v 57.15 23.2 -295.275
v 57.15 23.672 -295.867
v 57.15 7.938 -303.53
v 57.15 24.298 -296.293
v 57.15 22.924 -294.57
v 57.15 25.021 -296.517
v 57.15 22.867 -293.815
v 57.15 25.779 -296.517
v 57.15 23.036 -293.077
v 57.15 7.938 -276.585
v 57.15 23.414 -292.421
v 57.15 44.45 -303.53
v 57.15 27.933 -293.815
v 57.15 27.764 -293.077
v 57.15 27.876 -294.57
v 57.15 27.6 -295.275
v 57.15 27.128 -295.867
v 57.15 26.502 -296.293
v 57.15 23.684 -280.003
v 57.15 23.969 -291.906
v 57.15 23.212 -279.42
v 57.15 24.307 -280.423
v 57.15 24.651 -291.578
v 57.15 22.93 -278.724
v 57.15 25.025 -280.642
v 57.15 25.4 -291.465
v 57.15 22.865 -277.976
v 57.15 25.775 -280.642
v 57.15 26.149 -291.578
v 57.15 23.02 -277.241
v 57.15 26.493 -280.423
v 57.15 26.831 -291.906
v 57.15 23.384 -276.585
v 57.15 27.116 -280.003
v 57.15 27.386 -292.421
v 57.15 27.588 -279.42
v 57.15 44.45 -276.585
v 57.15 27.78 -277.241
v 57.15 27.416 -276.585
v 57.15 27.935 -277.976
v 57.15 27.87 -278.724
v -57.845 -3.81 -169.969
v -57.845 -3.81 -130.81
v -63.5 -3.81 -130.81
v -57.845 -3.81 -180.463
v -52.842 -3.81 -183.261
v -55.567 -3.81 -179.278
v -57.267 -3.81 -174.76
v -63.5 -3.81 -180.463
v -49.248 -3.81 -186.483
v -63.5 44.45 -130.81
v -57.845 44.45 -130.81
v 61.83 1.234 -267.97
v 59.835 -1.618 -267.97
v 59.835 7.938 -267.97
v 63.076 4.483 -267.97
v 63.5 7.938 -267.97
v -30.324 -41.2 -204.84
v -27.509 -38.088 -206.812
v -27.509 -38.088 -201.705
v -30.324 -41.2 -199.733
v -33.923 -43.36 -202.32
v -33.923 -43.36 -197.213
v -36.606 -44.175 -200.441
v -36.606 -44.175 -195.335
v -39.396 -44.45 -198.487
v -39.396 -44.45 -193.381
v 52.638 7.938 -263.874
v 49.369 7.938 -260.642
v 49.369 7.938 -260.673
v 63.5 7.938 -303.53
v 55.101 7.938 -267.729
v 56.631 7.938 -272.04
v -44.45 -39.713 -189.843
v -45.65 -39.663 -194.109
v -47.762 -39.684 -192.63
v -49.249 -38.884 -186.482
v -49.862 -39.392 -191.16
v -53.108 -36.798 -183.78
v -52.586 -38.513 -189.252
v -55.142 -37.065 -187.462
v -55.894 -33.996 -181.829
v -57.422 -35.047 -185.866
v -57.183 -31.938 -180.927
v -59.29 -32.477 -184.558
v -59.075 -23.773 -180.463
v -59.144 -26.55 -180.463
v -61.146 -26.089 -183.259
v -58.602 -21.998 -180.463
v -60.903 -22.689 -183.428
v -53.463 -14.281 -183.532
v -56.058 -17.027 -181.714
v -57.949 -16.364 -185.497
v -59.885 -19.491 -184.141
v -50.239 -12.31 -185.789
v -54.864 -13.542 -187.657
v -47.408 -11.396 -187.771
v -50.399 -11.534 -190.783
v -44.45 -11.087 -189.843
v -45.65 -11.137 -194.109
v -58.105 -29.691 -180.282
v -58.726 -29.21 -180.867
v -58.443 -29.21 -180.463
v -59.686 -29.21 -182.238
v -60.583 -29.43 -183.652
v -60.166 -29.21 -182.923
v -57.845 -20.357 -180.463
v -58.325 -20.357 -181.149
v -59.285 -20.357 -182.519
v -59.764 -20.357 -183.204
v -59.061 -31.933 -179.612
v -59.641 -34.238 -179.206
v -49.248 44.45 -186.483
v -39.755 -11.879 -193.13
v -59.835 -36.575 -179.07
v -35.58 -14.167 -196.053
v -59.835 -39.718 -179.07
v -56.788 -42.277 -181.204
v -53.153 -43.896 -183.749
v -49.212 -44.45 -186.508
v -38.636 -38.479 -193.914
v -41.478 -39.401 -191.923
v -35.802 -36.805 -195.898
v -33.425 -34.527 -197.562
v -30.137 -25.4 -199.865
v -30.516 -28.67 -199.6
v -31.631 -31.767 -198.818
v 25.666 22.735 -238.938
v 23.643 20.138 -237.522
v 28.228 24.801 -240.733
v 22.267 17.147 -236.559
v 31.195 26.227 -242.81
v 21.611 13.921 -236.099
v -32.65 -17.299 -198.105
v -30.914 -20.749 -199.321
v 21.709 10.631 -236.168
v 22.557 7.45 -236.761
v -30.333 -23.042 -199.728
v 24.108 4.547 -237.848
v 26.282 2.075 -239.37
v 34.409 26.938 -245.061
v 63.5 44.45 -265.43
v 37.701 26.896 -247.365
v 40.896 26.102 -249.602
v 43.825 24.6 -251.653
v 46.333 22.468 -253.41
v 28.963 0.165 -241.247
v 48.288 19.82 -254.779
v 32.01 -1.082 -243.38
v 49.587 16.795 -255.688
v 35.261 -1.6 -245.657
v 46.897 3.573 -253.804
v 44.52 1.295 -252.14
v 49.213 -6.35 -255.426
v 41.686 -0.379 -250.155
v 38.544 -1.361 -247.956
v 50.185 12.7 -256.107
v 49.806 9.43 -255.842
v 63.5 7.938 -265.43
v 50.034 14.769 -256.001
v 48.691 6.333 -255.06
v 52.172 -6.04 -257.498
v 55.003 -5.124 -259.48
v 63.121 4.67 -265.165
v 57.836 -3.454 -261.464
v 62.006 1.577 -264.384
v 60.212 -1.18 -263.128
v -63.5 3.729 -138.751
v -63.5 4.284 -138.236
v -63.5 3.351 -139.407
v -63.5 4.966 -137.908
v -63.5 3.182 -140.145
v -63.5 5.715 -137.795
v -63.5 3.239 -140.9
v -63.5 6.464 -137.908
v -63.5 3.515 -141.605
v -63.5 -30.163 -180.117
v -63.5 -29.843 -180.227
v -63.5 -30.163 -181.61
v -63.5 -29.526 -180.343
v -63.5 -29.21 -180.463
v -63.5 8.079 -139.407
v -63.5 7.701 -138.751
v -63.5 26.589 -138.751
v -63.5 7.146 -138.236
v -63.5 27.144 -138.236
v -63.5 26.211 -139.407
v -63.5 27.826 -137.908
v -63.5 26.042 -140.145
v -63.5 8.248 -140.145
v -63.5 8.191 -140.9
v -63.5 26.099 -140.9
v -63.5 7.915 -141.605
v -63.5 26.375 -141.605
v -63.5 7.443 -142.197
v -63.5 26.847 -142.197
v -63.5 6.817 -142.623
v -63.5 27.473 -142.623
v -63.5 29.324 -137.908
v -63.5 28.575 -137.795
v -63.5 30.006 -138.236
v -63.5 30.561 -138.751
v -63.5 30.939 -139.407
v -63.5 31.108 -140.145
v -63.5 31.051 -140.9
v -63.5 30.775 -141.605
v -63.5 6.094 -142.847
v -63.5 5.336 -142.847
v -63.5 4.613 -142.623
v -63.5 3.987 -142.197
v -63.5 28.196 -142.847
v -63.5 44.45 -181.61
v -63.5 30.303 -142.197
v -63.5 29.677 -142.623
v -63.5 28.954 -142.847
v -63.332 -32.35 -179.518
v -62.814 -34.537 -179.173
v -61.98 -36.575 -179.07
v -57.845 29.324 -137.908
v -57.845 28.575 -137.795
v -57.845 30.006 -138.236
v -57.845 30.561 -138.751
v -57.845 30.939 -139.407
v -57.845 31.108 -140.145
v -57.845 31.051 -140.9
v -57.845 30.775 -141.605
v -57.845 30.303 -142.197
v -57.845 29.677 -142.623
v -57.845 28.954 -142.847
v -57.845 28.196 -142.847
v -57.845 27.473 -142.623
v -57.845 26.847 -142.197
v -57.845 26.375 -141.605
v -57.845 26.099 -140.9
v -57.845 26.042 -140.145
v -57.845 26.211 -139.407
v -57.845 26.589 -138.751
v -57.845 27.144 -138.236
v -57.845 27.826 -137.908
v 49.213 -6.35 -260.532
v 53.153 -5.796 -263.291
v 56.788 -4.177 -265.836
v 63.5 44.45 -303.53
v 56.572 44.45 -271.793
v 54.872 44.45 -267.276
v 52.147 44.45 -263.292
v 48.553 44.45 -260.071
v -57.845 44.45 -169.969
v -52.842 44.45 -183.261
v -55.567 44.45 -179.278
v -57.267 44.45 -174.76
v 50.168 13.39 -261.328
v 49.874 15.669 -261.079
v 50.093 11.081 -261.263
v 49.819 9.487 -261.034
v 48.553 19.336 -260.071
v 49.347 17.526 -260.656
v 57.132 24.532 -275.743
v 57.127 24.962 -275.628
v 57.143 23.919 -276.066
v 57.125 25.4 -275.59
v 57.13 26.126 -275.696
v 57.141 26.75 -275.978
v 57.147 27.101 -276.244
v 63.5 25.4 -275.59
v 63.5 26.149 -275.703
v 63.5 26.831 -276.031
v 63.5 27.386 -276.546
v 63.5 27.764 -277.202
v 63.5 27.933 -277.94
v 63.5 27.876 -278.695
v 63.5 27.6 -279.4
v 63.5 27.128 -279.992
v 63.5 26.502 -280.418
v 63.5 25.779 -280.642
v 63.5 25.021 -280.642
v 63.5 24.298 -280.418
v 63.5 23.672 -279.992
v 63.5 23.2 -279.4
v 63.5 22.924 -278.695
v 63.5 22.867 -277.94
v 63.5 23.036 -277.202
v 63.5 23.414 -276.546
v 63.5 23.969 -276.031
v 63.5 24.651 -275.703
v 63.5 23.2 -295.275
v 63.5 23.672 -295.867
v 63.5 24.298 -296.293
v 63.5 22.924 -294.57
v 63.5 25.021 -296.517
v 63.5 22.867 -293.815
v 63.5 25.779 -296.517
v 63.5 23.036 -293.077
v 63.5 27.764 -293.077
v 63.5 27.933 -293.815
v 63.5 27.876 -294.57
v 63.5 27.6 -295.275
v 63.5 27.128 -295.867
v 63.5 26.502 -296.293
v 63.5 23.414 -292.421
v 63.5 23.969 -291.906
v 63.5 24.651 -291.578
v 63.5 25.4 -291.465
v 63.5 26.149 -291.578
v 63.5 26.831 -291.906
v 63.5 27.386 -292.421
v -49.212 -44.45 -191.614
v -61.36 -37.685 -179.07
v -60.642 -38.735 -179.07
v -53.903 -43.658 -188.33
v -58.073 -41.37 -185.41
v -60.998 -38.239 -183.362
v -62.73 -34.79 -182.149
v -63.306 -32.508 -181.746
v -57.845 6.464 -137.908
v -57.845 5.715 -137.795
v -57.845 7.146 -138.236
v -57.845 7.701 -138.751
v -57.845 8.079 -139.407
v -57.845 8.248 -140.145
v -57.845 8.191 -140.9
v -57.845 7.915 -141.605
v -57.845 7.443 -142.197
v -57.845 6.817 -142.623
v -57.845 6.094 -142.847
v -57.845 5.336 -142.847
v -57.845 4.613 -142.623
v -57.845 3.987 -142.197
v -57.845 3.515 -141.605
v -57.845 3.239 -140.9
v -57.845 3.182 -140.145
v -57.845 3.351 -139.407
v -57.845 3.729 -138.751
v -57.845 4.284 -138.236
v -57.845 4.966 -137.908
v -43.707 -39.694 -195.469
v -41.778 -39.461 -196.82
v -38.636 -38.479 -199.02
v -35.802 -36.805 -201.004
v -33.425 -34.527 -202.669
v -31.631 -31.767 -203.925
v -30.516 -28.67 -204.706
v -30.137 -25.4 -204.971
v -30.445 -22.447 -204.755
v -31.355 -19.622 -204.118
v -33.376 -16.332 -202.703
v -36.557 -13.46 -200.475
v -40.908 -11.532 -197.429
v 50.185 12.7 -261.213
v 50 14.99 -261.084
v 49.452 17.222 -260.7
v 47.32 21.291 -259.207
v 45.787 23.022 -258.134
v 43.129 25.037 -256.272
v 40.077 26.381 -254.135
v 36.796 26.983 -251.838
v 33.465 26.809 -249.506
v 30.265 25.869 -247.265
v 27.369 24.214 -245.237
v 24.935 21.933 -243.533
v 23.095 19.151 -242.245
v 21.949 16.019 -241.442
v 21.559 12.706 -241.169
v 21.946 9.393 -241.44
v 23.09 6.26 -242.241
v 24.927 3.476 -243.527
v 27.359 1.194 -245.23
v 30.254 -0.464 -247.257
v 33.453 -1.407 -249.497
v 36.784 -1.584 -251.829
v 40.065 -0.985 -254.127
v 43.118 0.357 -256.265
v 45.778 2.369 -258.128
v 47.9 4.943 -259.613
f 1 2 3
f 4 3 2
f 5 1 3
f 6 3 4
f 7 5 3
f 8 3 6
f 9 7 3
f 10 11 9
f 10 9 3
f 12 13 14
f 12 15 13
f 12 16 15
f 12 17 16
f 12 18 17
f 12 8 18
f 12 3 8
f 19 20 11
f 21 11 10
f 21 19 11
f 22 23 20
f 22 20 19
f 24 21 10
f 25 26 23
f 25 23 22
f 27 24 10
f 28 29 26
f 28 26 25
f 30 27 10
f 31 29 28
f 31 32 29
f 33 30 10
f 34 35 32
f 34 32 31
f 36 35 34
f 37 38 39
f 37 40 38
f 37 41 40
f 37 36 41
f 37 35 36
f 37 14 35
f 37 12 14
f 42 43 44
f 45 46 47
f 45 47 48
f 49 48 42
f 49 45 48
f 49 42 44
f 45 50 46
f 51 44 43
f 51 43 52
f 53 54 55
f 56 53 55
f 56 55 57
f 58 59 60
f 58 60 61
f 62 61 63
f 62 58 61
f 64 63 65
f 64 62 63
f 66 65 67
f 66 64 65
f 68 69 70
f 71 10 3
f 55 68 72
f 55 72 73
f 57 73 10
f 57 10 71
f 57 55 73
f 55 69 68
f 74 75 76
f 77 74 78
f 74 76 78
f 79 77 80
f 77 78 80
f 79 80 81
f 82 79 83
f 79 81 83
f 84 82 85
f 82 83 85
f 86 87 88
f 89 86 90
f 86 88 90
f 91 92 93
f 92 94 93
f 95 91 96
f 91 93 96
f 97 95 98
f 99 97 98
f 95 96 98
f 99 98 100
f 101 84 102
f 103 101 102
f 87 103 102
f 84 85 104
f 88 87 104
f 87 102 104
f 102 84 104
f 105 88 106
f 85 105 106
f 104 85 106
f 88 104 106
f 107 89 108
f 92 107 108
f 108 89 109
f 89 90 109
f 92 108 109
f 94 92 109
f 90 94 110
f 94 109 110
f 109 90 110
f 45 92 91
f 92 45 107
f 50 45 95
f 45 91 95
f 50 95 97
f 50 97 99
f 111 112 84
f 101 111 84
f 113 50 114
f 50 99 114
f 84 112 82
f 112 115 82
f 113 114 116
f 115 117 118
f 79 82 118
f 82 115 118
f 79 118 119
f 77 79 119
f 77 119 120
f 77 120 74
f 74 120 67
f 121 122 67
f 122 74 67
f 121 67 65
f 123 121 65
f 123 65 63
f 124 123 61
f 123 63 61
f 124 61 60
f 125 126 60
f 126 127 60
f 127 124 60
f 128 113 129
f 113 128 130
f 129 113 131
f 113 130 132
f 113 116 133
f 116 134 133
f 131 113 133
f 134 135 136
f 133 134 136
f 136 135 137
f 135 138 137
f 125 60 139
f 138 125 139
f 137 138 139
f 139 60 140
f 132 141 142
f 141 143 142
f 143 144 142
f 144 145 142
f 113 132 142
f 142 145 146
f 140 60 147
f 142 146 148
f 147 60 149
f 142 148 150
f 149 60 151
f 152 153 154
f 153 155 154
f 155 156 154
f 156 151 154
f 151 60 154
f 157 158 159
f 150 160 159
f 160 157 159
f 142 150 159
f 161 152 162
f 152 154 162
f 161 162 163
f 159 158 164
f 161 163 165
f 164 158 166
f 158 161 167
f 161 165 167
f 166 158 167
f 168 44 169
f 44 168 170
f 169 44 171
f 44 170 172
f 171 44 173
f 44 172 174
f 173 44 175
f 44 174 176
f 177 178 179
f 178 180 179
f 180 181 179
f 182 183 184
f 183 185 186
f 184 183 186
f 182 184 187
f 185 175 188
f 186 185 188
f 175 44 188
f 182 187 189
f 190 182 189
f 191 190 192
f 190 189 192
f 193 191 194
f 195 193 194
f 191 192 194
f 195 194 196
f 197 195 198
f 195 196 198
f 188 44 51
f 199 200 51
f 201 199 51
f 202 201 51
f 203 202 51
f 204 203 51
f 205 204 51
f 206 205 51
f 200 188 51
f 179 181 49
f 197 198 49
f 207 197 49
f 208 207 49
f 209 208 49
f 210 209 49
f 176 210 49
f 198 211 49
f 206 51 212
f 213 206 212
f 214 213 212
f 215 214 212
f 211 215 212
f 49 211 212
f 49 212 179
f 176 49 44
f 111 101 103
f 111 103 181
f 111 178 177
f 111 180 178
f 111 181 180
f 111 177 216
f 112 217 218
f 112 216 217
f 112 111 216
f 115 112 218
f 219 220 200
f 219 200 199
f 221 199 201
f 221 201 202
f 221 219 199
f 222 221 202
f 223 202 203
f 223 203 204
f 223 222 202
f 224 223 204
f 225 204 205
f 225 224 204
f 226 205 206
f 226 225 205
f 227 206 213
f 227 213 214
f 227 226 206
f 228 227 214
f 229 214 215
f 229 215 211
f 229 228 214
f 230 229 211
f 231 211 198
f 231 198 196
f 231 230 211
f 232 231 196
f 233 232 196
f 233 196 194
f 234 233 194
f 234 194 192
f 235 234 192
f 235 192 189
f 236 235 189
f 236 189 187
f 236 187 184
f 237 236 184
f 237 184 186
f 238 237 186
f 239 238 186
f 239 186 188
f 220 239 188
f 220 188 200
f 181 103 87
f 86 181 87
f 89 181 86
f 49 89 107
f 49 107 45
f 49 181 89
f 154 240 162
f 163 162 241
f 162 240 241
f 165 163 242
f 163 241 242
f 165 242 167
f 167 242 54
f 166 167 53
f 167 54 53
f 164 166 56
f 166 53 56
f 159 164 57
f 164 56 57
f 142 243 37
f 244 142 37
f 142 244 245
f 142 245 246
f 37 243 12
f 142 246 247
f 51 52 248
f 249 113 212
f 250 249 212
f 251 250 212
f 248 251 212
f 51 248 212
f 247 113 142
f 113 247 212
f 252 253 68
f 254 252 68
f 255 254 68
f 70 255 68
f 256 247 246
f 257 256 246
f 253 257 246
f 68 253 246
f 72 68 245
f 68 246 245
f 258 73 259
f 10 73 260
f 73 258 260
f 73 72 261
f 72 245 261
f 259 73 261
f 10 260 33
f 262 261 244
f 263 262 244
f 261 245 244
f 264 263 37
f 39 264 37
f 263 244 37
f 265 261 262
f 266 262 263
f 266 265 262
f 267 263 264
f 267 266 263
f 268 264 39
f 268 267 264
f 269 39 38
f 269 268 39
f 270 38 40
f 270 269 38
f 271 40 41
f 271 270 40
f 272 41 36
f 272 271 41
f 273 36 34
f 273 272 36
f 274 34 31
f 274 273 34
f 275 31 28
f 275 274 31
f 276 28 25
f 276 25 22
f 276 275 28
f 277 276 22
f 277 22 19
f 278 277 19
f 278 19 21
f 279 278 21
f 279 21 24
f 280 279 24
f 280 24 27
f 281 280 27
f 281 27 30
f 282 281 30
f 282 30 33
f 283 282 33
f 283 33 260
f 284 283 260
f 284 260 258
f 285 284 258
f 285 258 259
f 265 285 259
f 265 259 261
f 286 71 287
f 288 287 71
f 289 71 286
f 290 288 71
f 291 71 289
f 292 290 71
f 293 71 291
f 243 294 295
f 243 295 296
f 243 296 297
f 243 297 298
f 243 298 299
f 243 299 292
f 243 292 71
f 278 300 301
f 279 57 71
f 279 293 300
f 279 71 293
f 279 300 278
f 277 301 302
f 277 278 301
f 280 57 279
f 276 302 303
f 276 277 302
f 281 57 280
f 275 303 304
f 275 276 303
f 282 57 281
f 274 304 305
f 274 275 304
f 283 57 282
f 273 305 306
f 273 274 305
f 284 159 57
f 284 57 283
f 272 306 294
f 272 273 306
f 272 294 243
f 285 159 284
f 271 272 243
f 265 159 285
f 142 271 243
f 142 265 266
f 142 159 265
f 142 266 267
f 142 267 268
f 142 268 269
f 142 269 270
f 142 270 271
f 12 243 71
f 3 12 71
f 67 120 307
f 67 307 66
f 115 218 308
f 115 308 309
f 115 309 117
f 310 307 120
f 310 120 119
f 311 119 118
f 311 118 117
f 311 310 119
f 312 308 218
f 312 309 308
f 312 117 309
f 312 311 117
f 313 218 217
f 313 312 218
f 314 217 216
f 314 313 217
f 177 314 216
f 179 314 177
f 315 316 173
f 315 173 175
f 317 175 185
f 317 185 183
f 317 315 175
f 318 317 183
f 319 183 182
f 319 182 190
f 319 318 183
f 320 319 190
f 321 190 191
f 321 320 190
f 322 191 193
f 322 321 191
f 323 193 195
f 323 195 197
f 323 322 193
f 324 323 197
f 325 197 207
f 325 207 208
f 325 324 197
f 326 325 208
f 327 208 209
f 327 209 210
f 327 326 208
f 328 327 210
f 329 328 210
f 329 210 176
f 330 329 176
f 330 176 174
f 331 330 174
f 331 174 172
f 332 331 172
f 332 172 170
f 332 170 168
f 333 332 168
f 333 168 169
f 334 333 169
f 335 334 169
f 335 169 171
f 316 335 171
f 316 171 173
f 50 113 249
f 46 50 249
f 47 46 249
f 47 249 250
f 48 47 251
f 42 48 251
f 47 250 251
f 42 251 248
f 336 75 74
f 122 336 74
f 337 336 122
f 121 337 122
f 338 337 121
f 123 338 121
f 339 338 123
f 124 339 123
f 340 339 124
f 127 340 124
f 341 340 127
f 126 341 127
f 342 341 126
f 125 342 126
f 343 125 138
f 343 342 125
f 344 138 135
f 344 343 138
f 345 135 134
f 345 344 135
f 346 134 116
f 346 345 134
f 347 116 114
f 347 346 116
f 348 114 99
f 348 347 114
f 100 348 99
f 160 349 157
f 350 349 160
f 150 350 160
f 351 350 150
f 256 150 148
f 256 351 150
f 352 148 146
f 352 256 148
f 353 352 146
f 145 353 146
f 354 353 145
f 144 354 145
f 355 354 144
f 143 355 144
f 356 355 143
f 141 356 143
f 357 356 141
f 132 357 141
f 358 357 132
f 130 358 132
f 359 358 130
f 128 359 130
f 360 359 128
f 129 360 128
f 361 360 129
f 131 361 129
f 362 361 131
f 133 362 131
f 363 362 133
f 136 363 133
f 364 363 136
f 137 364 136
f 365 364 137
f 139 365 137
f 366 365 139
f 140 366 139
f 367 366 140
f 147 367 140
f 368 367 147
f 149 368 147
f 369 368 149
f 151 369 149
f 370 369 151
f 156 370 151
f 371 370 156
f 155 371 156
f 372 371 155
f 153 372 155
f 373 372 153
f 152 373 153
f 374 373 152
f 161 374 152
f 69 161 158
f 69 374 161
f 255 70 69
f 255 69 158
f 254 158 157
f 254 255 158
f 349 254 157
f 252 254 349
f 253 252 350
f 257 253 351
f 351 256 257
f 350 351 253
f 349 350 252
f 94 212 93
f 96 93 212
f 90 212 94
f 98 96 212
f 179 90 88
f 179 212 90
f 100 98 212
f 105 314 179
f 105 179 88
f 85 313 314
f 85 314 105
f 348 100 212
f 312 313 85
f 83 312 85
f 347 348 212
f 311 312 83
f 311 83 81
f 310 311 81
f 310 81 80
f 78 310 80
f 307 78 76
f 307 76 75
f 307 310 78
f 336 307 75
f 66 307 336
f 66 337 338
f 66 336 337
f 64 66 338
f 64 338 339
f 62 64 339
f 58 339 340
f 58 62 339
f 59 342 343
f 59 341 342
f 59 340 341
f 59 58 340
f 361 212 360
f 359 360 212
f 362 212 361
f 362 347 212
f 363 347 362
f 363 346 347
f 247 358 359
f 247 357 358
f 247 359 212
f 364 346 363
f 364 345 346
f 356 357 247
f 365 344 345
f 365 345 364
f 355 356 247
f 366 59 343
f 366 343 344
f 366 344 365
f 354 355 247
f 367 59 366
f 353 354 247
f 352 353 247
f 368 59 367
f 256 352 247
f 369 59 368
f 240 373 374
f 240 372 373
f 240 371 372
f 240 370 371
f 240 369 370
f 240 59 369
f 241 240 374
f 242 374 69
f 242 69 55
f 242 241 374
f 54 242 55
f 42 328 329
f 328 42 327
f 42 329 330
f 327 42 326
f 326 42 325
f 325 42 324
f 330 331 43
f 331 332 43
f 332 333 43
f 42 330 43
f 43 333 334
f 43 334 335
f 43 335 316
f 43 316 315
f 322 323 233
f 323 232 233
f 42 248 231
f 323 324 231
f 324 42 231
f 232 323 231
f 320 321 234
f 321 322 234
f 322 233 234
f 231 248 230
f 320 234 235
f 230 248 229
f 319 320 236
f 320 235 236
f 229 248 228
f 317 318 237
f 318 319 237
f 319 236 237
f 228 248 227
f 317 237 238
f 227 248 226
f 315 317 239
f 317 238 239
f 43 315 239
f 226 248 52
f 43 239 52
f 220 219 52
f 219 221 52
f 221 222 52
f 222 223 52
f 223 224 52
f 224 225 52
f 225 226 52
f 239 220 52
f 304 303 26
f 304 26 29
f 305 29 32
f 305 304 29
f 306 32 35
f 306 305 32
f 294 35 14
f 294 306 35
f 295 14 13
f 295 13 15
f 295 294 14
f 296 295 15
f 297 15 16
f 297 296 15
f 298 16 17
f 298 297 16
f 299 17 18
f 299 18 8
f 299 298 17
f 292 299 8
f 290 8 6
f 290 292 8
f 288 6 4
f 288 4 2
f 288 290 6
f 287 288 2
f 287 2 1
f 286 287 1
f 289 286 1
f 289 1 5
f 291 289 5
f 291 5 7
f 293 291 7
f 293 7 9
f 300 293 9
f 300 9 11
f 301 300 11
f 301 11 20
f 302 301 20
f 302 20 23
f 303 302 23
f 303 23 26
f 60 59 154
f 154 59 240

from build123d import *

# Parameters (mm, degrees)
SKETCH1_R                = 14.312899999999999
BOSS_EXTRUDE1_DEPTH      = 6.35
FILLET1_R                = 14.2875
SKETCH2_W                = 63.5
SKETCH2_H                = 38.099999999999994
BOSS_EXTRUDE2_DEPTH      = 6.35
FILLET2_R                = 14.2875
SKETCH5_W                = 80.56082205671558
SKETCH5_H                = 59.96207335790194
CUT_EXTRUDE3_DEPTH       = 105.34114720473416
SKETCH6_R                = 14.312899999999999
BOSS_EXTRUDE3_DEPTH      = 88.89999999999999
CHAMFER1_SIZE            = 123.334861862
CHAMFER1_SIZE_2          = 86.36
CHAMFER2_START           = -41.62371919
CHAMFER2_OUTLINE_W       = 158.00000000000003
CHAMFER2_OUTLINE_H       = 88.9
CHAMFER2_DEPTH           = 70.741970545
BOSS_EXTRUDE4_DEPTH      = 6.35
BOSS_EXTRUDE5_DEPTH      = 73.65999999999998
CUT_EXTRUDE9_DEPTH       = 140.7047508401556
CUT_EXTRUDE9_DEPTH_BACK  = 140.7047508401556
CUT_EXTRUDE10_DEPTH      = 73.65999999999998
CUT_EXTRUDE10_DEPTH_BACK = 184.87947802715968
FILLET3_R                = 20.16
SKETCH19_R               = 2.539999999999996
CUT_EXTRUDE11_DEPTH      = 184.87947795602068
SKETCH20_R               = 2.5400000000000027
SKETCH20_R_2             = 2.540000000000001
CUT_EXTRUDE12_DEPTH      = 188.65942191717963
FILLET4_R                = 20.16
CUT_EXTRUDE13_DEPTH      = 330.8952367610784
CUT_EXTRUDE13_DEPTH_BACK = 330.8952367610784
SKETCH21_W               = 304.0212933781311
SKETCH21_H               = 127.80861110845143


with BuildPart() as part:
    # Sketch1 → Boss-Extrude1 (new body)
    with BuildSketch(Plane.XY):
        Polygon((-6.34999999999998, -6.349999999999993), (63.500000000000014, -6.349999999999988), (63.50000000000003, 44.44999999999999), (-63.49999999999997, 44.44999999999999), (-63.49999999999994, -44.45), (-31.749999999999943, -44.45), align=None)
        with Locations((-44.44999999999997, -25.400000000000006)):
            Circle(SKETCH1_R, mode=Mode.SUBTRACT)
        with Locations((35.87185256827684, 12.70000000000001)):
            Circle(SKETCH1_R, mode=Mode.SUBTRACT)
    extrude(amount=BOSS_EXTRUDE1_DEPTH)

    # Fillet1
    fillet1_edges = [part.edges().sort_by_distance(p)[0] for p in [
        (-31.749999999999943, -44.45, 3.175),
        (-63.49999999999994, -44.45, 3.175),
        (63.50000000000002, -6.349999999999987, 3.175),
        (-6.349999999999981, -6.349999999999993, 3.175),
    ]]
    fillet(fillet1_edges, radius=FILLET1_R)

    # Sketch2 → Boss-Extrude2 (add)
    with BuildSketch(Plane.XY.offset(6.35)):
        with Locations((2.842e-14, 63.499999999999986)):
            Rectangle(SKETCH2_W, SKETCH2_H)
    extrude(amount=-BOSS_EXTRUDE2_DEPTH)

    # Fillet2
    fillet2_edges = [part.edges().sort_by_distance(p)[0] for p in [
        (-31.74999999999997, 82.54999999999998, 3.175),
        (31.75000000000003, 82.54999999999998, 3.175),
        (31.75000000000003, 44.44999999999999, 3.175),
    ]]
    fillet(fillet2_edges, radius=FILLET2_R)

    # Sketch5 → Cut-Extrude3 (cut, through all)
    with BuildSketch(Plane.XY.offset(6.35)):
        with Locations((8.530411028357818, 74.43103667895096)):
            Rectangle(SKETCH5_W, SKETCH5_H)
    extrude(amount=-CUT_EXTRUDE3_DEPTH, mode=Mode.SUBTRACT)

    # Sketch6 → Boss-Extrude3 (add)
    # profile 1 of 2: a face of its own
    with BuildSketch(Plane.XY.offset(6.35)):
        with BuildLine():
            Line((-27.50851936904525, -38.08777905356794), (49.21250000000003, -6.349999999999989))
            Line((49.21250000000003, -6.349999999999989), (1.296437949397273, -6.3499999999999925))
            ThreePointArc((1.296437949397273, -6.3499999999999925), (-5.445232161641531, -8.040574170103001), (-10.591480630954672, -12.71222094643204))
            Line((-10.591480630954672, -12.71222094643204), (-27.50851936904525, -38.08777905356794))
        make_face()
    # profile 2 of 2: a face of its own
    with BuildSketch(Plane.XY.offset(6.35)):
        with BuildLine():
            ThreePointArc((49.21250000000003, -6.349999999999989), (59.315288136202824, -2.1652881362027863), (63.50000000000003, 7.937500000000011))
            Line((63.50000000000003, 7.937500000000011), (63.50000000000003, 44.44999999999999))
            Line((63.50000000000003, 44.44999999999999), (-63.49999999999997, 44.44999999999999))
            Line((-63.49999999999997, 44.44999999999999), (-63.49999999999994, -30.162500000000005))
            ThreePointArc((-63.49999999999994, -30.162500000000005), (-59.31528813620274, -40.2652881362028), (-49.21249999999995, -44.45))
            Line((-49.21249999999995, -44.45), (-39.396437949397196, -44.45))
            ThreePointArc((-39.396437949397196, -44.45), (-32.65476783835839, -42.759425829897), (-27.50851936904525, -38.08777905356794))
            Line((-27.50851936904525, -38.08777905356794), (-10.591480630954672, -12.71222094643204))
            ThreePointArc((-10.591480630954672, -12.71222094643204), (-5.445232161641531, -8.040574170103001), (1.296437949397273, -6.3499999999999925))
            Line((1.296437949397273, -6.3499999999999925), (49.21250000000003, -6.349999999999989))
        make_face()
        with Locations((35.87185256827684, 12.70000000000001)):
            Circle(SKETCH6_R, mode=Mode.SUBTRACT)
        with Locations((-44.44999999999997, -25.400000000000006)):
            Circle(SKETCH6_R, mode=Mode.SUBTRACT)
    extrude(amount=-BOSS_EXTRUDE3_DEPTH)

    # Chamfer1
    # the kernel refuses this chamfer: 123.334861862, 86.36 mm, written as the material it takes off along each edge
    with BuildSketch(Plane(origin=(63.50000000000003, -310.58122257411287, -82.55), x_dir=(-1, 0, 0), z_dir=(0, 1, 0))) as chamfer1_piece_1:
        Polygon((CHAMFER1_SIZE, 0), (0, CHAMFER1_SIZE_2), (0, 0), align=None)
    extrude(amount=673.5499451482258, mode=Mode.SUBTRACT)

    # Chamfer2: read off the stored shape, not the designer's step
    # Chamfer2 outline → Chamfer2 (cut)
    with BuildSketch(Plane(origin=(0, 0, 0), x_dir=(0.819152044288991, 0, 0.5735764363510472), z_dir=(0.5735764363510472, 0, -0.8191520442889911)).offset(CHAMFER2_START)):
        with Locations((-22.000000000000004, 0)):
            Rectangle(CHAMFER2_OUTLINE_W, CHAMFER2_OUTLINE_H)
    extrude(amount=CHAMFER2_DEPTH, mode=Mode.SUBTRACT)

    # Sketch8 → Boss-Extrude4 (add)
    with BuildSketch(Plane(origin=(63.50000000000003, 0, 0), x_dir=(0, 0, -1), z_dir=(1, 0, 0))):
        Polygon((-3.8100000000002296, 44.44999999999999), (-41.91000000000023, 44.44999999999998), (-41.910000000000224, 7.937500000000005), (-3.8100000000002257, 7.937500000000011), align=None)
    extrude(amount=-BOSS_EXTRUDE4_DEPTH)

    # Sketch10 → Boss-Extrude5 (add)
    with BuildSketch(Plane(origin=(0, 44.44999999999999, 0), x_dir=(1, 0, 0), z_dir=(0, 1, 0))):
        Polygon((-57.84497848897024, 130.81000000000014), (-63.49999999999997, 130.81000000000014), (-63.49999999999997, 80.01000000000018), (-57.844978488970234, 80.01000000000016), align=None)
    extrude(amount=-BOSS_EXTRUDE5_DEPTH)

    # Sketch17 → Cut-Extrude9 (cut, two sides: drawn at the far end of the back side and taken through both)
    with BuildSketch(Plane(origin=(19.10074600681286, 0, -27.278692336917096), x_dir=(-0.8191520442889909, 0, -0.5735764363510474), z_dir=(0.5735764363510474, 0, -0.8191520442889909)).offset(-CUT_EXTRUDE9_DEPTH_BACK)):
        with BuildLine():
            add(Edge.make_bspline(
                [(94.42353448054058, -29.21), (95.93788750756819, -24.718047698019056), (93.93338517829203, -20.356820676396385)],
                knots=[2.872150837356143, 2.872150837356143, 2.872150837356143, 3.5016757767347815, 3.5016757767347815, 3.5016757767347815], degree=2, weights=[1, 0.9508699428937519, 1]))
            add(Edge.make_bspline(
                [(93.93338517829203, -20.356820676396385), (88.79622683458668, -9.179825042266891), (74.45226902252679, -11.318450120374129), (60.108311210466894, -13.457075198481366), (60.108311210466894, -25.4)],
                knots=[3.5016757767347815, 3.5016757767347815, 3.5016757767347815, 4.892430541957184, 4.892430541957184, 6.283185307179586, 6.283185307179586, 6.283185307179586], degree=2, weights=[1, 0.7678119767762641, 1, 0.7678119767762641, 1]))
            add(Edge.make_bspline(
                [(60.108311210466894, -25.400000000000002), (60.108311210466894, -37.903779229296156), (75.2342951684929, -39.58320874739981), (90.36027912651893, -41.262638265503455), (94.42353448054058, -29.21)],
                knots=[0, 0, 0, 1.4360754186780715, 1.4360754186780715, 2.872150837356143, 2.872150837356143, 2.872150837356143], degree=2, weights=[1, 0.7530981852489751, 1, 0.7530981852489751, 1]))
        make_face()
    extrude(amount=CUT_EXTRUDE9_DEPTH + CUT_EXTRUDE9_DEPTH_BACK, mode=Mode.SUBTRACT)

    # Sketch18 → Cut-Extrude10 (cut, two sides: drawn at the far end of the back side and taken through both)
    with BuildSketch(Plane(origin=(-57.84497848897023, 0, 7.9e-15), x_dir=(-1.4e-16, 0, -1), z_dir=(1, 0, -1.4e-16)).offset(-CUT_EXTRUDE10_DEPTH_BACK)):
        Polygon((130.81000000000014, -29.21), (81.15666866187213, -29.210000000000008), (81.15666866187213, -3.8100000000000076), (130.81000000000014, -3.810000000000001), align=None)
    extrude(amount=CUT_EXTRUDE10_DEPTH + CUT_EXTRUDE10_DEPTH_BACK, mode=Mode.SUBTRACT)

    # Fillet3
    # the kernel refuses this fillet: 20.16 mm, written as the material it adds along each edge
    with BuildSketch(Plane(origin=(57.150000000000034, 44.44999999999999, 4.470039485332174), x_dir=(-0.8191520442889912, 0, -0.5735764363510469), z_dir=(0, -1, 0))) as fillet3_piece_1_section:
        with BuildLine():
            CenterArc((FILLET3_R * 0.520567050552, -FILLET3_R), FILLET3_R, 90.00000000000001, 54.99999999999993)
            Line((-FILLET3_R * 0.298584993737, -FILLET3_R * 0.426423563649), (0, 0))
            Line((0, 0), (FILLET3_R * 0.520567050552, 0))
        make_face()
    fillet3_piece_1 = extrude(amount=36.51249999999998, mode=Mode.PRIVATE)
    fillet3_piece_1 = fillet3_piece_1 - Plane(origin=(35.87185256827684, 12.70000000000001, 4.470039485332174), x_dir=(1, 0, 0), z_dir=(0, 0, 1)) * Cylinder(14.312899999999999, 116, mode=Mode.PRIVATE)
    add(fillet3_piece_1)
    with BuildSketch(Plane(origin=(-57.844978488970234, 44.44999999999999, -81.15666866204359), x_dir=(0.8191520442884476, 0, 0.5735764363518233), z_dir=(0, -1, 0))) as fillet3_piece_2:
        with BuildLine():
            CenterArc((FILLET3_R * 0.520567050551, -FILLET3_R), FILLET3_R, 90.00000000000001, 54.99999999994567)
            Line((-FILLET3_R * 0.298584993737, -FILLET3_R * 0.426423563648), (0, 0))
            Line((0, 0), (FILLET3_R * 0.520567050551, 0))
        make_face()
    extrude(amount=48.25999999999999)

    # Sketch19 → Cut-Extrude11 (cut, through all)
    with BuildSketch(Plane(origin=(-57.84497848897023, 0, 7.9e-15), x_dir=(-1.4e-16, 0, -1), z_dir=(1, 0, -1.4e-16))):
        with Locations((121.28500000000014, 28.57499999999999)):
            Circle(SKETCH19_R)
        with Locations((121.28500000000014, 5.7149999999999945)):
            Circle(SKETCH19_R)
    extrude(amount=-CUT_EXTRUDE11_DEPTH, mode=Mode.SUBTRACT)

    # Sketch20 → Cut-Extrude12 (cut, through all)
    with BuildSketch(Plane(origin=(63.50000000000003, 0, 0), x_dir=(0, 0, -1), z_dir=(1, 0, 0))):
        with Locations((-32.38500000000023, 25.39999999999998)):
            Circle(SKETCH20_R)
        with Locations((-16.510000000000232, 25.399999999999977)):
            Circle(SKETCH20_R_2)
    extrude(amount=-CUT_EXTRUDE12_DEPTH, mode=Mode.SUBTRACT)

    # Fillet4
    # the kernel refuses this fillet: 20.16 mm, written as the material it takes off along each edge
    with BuildSketch(Plane(origin=(-41.42329156376277, -29.209999999999994, -82.55), x_dir=(0, -2.04e-14, 1), z_dir=(-1, 0, 0))) as fillet4_piece_1:
        with BuildLine():
            CenterArc((20.160000000000146, -7.364628119294481), FILLET4_R, 158.57340370727903, 21.426596292722138)
            Line((1.5023e-13, -7.364628119294892), (-0.403199999999848, -7.3646281192949))
            Line((-0.403199999999848, -7.3646281192949), (-0.4031999999999982, -8.22e-15))
            Line((-0.4031999999999982, -8.22e-15), (-8.22e-15, 0.4031999999999982))
            ThreePointArc((-8.22e-15, 0.4031999999999982), (0.6966656690639528, 0.4031999999999982), (1.0179979648904802, 0.14729256238588861))
            Line((1.0179979648904802, 0.14729256238588861), (1.393331338127922, 0))
        make_face()
    extrude(amount=40.48827873447443, mode=Mode.SUBTRACT)

    # Mirror1: part across plane


with BuildPart() as part_1:
    add(part.part)
    add(part.part.mirror(Plane(origin=(-57.84497848897024, -29.21, -130.81000000000014), x_dir=(1, 0, 0), z_dir=(0, 0, -1))))

    # Sketch21 → Cut-Extrude13 (cut, two sides: drawn at the far end of the back side and taken through both)
    with BuildSketch(Plane(origin=(-57.84497848897023, 0, 7.9e-15), x_dir=(-1.4e-16, 0, -1), z_dir=(1, 0, -1.4e-16)).offset(-CUT_EXTRUDE13_DEPTH_BACK)):
        with Locations((-21.20064668906538, -19.454305554225726)):
            Rectangle(SKETCH21_W, SKETCH21_H)
    extrude(amount=CUT_EXTRUDE13_DEPTH + CUT_EXTRUDE13_DEPTH_BACK, mode=Mode.SUBTRACT)


solid = part_1.part
